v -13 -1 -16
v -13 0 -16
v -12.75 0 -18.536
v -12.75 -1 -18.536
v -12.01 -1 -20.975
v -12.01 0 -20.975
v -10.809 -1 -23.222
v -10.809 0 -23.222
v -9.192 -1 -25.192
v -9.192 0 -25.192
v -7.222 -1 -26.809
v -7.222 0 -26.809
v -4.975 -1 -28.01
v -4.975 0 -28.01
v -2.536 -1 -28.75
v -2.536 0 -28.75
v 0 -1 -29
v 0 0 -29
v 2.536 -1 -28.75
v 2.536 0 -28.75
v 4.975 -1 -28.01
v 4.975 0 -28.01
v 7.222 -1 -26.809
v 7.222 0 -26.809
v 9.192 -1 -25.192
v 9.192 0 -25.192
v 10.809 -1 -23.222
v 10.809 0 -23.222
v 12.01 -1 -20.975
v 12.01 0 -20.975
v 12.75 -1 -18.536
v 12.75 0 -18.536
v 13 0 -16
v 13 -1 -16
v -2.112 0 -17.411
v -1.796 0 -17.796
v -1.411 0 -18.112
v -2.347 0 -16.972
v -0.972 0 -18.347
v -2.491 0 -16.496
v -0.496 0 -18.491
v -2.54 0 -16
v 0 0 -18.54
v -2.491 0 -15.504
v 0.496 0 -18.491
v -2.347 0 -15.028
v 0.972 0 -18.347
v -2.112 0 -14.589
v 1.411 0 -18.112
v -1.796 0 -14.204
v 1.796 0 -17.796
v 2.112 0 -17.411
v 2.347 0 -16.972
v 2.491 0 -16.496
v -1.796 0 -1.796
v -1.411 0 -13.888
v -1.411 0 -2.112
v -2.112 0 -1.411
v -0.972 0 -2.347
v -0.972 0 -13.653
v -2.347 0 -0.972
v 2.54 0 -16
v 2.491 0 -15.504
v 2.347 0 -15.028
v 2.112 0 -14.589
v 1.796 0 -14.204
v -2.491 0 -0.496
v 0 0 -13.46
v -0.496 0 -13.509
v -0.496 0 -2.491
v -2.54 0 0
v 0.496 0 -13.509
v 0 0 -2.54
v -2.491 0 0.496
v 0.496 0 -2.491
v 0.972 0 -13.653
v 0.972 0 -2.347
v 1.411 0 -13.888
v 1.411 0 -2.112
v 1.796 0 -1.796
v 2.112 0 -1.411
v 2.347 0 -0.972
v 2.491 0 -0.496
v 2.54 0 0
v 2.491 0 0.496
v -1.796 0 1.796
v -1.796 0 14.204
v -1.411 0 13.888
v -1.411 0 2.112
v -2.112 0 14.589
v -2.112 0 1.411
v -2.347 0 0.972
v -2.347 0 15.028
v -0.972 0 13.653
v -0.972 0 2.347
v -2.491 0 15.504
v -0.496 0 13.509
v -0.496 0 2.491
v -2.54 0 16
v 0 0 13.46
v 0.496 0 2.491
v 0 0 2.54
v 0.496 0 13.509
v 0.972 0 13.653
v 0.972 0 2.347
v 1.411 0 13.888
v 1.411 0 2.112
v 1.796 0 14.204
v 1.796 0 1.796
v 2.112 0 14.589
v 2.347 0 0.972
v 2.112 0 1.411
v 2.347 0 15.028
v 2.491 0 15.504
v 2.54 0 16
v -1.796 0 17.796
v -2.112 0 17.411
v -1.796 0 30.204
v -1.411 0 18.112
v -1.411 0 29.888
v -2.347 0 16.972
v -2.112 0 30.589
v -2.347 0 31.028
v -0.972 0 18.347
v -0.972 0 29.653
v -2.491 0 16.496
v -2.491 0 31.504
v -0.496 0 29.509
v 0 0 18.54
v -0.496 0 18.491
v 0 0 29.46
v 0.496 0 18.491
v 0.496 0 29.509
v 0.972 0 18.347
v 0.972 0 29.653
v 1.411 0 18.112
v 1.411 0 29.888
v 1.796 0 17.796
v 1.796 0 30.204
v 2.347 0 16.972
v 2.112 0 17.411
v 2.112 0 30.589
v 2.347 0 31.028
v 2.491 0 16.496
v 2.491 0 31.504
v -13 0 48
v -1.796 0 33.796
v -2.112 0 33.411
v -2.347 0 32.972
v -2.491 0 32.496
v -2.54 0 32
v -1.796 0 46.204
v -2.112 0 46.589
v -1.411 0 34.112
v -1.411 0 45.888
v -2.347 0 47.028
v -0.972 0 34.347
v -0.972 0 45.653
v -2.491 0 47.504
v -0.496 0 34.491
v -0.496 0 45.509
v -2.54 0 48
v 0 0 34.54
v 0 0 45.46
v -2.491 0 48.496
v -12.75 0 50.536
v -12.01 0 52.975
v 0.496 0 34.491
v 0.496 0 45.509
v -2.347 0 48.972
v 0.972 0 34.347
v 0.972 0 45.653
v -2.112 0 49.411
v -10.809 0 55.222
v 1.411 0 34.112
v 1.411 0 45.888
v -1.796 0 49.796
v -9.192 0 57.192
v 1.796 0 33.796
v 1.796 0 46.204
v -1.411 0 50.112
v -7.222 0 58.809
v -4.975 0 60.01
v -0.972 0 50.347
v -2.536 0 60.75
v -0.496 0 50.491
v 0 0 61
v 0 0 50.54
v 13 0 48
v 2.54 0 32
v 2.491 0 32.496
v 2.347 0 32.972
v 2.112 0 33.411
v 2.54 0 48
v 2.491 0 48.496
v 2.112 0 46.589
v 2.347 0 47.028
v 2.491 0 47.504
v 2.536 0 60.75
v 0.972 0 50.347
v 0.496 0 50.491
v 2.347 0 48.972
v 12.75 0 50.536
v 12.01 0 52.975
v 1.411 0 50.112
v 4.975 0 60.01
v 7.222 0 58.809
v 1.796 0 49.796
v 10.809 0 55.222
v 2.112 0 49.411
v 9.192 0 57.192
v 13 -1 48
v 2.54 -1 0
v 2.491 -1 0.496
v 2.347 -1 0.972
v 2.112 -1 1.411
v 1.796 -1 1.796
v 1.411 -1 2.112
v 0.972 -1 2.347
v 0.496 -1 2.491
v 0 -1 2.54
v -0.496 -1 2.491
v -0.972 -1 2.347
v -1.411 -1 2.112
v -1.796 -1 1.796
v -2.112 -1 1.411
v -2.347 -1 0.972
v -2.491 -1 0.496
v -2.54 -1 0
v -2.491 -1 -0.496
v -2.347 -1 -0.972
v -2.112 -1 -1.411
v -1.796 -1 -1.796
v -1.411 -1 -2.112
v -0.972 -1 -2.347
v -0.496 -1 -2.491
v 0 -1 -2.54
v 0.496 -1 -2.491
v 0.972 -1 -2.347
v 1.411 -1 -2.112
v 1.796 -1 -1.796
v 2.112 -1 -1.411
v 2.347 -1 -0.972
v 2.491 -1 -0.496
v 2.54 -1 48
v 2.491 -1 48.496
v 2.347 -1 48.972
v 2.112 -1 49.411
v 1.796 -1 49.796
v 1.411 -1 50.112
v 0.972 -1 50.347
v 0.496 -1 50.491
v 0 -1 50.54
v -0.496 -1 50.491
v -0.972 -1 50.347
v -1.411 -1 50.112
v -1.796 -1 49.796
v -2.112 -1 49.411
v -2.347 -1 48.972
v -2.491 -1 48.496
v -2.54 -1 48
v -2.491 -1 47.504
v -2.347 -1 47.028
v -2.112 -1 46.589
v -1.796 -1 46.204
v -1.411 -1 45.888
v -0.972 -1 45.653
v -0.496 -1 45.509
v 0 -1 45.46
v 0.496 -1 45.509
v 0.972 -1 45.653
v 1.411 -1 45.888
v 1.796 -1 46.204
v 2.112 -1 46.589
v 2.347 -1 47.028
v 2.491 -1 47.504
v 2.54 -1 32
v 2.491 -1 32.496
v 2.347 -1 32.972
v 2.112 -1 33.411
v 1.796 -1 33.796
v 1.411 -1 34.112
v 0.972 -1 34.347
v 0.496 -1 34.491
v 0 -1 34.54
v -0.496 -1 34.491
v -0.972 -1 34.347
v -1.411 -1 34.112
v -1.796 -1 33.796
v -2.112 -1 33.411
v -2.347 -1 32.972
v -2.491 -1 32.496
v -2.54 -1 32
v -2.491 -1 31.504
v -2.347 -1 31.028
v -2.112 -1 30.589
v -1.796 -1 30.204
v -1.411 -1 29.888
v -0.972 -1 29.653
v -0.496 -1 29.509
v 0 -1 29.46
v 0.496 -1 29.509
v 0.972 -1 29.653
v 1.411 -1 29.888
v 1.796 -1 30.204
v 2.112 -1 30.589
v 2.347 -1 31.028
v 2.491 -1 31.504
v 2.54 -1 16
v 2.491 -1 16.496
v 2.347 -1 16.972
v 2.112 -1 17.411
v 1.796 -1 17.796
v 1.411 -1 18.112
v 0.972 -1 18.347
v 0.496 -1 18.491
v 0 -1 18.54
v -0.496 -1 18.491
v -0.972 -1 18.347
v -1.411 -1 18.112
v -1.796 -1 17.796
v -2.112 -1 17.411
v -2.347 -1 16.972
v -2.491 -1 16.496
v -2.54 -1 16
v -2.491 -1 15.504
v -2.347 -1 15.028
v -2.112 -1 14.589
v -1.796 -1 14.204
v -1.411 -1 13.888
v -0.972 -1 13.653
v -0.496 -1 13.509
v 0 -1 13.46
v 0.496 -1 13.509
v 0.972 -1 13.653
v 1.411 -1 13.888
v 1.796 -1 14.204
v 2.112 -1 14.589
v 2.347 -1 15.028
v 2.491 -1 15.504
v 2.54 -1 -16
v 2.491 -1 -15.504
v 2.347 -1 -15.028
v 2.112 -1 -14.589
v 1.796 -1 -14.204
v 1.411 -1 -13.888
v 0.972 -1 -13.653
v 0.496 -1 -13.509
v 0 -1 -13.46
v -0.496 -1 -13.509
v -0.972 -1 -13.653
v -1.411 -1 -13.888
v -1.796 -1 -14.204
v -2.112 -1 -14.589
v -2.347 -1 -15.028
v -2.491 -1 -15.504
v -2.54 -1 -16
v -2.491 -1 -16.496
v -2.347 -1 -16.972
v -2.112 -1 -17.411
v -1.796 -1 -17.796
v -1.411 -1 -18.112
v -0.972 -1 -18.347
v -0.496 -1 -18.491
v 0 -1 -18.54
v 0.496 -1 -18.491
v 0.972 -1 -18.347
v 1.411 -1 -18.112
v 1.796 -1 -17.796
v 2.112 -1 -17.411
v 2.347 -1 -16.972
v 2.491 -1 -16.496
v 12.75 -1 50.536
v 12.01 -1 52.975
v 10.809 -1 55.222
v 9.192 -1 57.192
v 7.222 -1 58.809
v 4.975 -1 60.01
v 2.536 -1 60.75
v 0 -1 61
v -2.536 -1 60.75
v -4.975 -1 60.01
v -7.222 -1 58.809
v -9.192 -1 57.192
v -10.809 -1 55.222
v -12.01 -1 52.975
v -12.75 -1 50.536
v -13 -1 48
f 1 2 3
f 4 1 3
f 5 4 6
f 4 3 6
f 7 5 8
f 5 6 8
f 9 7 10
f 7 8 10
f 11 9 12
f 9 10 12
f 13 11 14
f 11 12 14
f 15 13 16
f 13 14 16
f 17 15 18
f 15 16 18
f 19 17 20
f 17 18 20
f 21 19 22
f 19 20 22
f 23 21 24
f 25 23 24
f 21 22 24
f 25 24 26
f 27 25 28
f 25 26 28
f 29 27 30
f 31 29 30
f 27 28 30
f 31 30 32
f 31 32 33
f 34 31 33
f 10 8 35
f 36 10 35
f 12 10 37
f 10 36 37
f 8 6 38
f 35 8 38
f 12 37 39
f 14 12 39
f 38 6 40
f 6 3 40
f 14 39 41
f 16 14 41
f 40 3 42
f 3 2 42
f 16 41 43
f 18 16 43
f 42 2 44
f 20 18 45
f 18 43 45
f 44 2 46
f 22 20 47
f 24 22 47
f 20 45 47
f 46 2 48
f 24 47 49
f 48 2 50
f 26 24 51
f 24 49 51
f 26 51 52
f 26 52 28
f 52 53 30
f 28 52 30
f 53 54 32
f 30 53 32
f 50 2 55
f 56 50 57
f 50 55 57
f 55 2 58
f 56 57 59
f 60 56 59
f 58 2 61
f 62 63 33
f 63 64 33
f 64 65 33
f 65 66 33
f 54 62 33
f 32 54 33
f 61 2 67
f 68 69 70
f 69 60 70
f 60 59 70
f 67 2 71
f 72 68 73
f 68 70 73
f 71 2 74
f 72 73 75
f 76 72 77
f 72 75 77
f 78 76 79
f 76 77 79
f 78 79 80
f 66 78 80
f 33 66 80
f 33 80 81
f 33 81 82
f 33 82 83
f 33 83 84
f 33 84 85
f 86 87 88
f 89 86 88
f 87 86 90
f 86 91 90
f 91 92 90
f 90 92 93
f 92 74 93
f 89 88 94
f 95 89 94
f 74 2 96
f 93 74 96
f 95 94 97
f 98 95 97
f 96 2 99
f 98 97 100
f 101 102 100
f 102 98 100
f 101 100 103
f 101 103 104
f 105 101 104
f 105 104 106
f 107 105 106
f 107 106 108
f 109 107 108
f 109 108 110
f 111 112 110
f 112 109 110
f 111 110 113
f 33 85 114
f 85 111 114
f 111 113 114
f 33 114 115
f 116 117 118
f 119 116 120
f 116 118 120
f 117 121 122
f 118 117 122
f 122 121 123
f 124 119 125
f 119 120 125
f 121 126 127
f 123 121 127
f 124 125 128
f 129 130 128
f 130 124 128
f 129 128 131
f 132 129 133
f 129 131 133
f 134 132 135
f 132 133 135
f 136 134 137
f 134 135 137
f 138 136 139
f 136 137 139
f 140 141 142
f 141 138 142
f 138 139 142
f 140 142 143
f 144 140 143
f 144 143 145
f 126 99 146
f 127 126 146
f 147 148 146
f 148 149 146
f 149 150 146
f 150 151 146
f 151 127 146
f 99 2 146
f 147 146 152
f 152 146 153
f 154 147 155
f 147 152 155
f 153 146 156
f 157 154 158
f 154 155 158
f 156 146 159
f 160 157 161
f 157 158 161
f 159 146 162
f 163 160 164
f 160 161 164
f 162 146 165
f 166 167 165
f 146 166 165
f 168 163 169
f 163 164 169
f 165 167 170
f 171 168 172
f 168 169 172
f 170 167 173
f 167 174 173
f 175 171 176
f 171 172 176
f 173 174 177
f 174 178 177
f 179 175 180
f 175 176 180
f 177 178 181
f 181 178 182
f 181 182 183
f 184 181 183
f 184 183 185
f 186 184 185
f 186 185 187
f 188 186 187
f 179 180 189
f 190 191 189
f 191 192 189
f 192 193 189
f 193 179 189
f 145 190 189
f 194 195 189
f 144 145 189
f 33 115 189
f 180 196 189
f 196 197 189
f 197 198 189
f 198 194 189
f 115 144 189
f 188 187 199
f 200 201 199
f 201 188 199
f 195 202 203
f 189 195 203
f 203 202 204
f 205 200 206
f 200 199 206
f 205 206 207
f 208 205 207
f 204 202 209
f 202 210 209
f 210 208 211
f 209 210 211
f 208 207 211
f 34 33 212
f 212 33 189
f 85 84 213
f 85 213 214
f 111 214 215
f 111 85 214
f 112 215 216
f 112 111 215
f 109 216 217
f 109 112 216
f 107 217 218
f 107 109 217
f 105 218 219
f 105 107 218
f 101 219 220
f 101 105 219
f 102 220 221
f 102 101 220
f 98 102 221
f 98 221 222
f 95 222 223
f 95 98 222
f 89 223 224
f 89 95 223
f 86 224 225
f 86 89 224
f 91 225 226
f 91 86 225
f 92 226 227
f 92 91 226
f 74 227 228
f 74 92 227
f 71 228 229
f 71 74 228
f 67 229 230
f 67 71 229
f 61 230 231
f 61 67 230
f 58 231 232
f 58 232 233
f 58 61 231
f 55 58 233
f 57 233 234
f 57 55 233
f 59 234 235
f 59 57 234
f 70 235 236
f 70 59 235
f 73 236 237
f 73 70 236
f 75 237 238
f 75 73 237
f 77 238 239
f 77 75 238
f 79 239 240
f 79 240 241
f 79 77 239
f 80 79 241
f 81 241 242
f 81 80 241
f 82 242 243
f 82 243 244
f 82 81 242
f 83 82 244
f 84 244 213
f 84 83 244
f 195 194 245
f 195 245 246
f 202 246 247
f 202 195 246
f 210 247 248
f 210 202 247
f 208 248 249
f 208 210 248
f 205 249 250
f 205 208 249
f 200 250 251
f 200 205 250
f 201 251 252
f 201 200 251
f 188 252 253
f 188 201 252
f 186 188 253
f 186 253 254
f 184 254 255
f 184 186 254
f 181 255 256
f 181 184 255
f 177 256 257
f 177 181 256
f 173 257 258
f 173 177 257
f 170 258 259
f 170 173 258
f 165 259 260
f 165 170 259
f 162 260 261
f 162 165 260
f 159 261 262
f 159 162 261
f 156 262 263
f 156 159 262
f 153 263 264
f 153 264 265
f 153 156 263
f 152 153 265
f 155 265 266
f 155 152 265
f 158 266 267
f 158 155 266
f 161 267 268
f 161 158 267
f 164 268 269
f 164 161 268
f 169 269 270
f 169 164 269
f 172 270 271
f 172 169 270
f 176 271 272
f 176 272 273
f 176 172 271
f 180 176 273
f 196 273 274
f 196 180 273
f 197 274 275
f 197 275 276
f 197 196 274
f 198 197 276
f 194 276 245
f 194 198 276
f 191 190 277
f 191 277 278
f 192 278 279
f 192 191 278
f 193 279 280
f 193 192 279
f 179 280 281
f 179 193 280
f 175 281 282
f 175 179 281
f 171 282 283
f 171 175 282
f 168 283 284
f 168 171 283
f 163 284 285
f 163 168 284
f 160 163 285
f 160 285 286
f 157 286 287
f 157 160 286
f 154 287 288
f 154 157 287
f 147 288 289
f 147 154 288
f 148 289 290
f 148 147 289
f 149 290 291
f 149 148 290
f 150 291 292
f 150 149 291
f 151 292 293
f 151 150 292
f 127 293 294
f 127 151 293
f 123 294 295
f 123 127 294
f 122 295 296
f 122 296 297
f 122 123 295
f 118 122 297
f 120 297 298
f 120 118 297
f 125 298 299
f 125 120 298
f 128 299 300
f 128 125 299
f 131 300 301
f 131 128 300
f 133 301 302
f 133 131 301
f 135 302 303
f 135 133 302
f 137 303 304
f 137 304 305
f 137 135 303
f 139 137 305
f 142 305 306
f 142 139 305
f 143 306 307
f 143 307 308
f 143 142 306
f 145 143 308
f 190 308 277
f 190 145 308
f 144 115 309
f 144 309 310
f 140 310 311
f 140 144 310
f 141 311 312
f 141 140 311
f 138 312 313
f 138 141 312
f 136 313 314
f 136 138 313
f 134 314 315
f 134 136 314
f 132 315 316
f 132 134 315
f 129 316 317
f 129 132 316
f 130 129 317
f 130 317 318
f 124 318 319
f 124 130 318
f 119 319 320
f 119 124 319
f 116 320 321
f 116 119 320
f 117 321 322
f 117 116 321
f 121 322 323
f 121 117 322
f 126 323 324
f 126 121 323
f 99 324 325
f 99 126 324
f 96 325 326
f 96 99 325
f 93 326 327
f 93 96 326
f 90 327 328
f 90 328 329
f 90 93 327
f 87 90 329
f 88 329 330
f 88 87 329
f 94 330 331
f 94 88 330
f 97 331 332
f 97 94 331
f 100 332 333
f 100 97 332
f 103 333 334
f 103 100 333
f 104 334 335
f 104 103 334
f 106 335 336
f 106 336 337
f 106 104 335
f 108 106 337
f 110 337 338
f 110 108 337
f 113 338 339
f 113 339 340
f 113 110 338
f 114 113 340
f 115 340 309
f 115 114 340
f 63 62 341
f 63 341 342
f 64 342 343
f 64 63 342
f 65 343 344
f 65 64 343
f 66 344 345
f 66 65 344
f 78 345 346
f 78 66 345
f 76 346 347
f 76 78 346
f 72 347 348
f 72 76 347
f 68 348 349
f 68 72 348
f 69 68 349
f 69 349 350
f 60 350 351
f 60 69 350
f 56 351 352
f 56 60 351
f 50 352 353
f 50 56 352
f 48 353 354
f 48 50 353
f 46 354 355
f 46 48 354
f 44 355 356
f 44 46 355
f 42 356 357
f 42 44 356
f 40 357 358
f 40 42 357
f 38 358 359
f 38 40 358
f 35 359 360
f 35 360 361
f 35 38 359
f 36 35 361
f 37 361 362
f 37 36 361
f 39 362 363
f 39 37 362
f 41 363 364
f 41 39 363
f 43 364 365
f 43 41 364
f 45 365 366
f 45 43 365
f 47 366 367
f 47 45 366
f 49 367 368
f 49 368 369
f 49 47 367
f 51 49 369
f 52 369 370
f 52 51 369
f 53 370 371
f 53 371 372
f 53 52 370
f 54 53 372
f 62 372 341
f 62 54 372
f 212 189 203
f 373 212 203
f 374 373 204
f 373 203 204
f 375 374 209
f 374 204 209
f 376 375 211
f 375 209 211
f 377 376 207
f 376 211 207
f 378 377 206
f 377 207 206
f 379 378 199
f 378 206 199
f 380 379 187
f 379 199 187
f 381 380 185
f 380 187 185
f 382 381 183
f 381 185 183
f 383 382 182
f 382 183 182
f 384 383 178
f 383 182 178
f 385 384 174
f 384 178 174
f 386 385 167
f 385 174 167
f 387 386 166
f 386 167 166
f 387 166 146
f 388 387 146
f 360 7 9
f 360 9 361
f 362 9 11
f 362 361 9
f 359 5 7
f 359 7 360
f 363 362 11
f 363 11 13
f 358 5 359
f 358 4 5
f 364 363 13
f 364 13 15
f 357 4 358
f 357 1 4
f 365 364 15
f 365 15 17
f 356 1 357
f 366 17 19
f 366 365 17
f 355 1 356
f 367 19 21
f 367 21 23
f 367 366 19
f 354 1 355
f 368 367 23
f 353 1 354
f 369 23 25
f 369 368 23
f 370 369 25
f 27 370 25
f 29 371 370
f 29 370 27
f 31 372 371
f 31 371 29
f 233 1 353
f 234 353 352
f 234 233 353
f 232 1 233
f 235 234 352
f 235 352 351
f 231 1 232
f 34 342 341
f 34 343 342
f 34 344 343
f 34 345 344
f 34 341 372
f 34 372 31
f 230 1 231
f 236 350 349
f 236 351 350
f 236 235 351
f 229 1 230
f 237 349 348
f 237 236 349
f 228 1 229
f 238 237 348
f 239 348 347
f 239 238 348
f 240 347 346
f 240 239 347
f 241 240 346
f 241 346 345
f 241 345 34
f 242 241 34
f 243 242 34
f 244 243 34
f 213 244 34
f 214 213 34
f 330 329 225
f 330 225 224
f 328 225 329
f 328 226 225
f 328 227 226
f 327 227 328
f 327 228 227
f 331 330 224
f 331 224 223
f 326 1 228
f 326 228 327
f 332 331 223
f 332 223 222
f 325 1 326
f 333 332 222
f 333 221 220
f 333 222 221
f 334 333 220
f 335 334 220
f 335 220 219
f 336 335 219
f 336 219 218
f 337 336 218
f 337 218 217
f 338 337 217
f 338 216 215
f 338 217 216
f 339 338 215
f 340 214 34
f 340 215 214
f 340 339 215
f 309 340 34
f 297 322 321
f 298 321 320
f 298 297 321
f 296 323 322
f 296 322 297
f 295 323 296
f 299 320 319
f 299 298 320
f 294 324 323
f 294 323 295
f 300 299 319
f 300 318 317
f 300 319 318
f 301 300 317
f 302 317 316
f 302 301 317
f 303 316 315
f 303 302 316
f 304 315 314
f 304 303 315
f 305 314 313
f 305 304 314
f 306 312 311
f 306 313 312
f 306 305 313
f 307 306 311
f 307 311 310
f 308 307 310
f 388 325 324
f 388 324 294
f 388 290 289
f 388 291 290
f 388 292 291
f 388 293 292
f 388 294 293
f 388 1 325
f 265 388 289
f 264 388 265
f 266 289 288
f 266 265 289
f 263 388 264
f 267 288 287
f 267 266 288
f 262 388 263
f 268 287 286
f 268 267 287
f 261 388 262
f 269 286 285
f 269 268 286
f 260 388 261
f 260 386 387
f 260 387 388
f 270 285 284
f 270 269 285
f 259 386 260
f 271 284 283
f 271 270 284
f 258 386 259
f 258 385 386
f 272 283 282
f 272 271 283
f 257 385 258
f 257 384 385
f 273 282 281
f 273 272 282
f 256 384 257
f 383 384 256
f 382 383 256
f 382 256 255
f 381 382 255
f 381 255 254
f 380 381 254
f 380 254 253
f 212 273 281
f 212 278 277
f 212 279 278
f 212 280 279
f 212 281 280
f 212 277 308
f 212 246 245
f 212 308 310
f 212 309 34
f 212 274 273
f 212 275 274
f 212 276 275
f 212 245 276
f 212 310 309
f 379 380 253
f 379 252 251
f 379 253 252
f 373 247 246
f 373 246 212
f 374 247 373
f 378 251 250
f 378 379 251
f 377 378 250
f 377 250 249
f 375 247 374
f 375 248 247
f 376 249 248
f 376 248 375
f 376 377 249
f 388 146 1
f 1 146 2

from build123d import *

# Parameters (mm, degrees)
F0_R     = 2.54
F1_DEPTH = 1


with BuildPart() as f1:
    # F0 (on Front) → F1 (new body)
    with BuildSketch(Plane.XZ):
        with BuildLine():
            ThreePointArc((13, 48), (0, 35), (-13, 48))
            Line((-13, 48), (-13, -16))
            ThreePointArc((-13, -16), (0, -3), (13, -16))
            Line((13, -16), (13, 48))
        make_face()
        Circle(F0_R, mode=Mode.SUBTRACT)
        with Locations((0, 16)):
            Circle(F0_R, mode=Mode.SUBTRACT)
        with Locations((0, 32)):
            Circle(F0_R, mode=Mode.SUBTRACT)
        with BuildLine():
            ThreePointArc((13, 48), (0, 61), (-13, 48))
            ThreePointArc((-13, 48), (0, 35), (13, 48))
        make_face()
        with Locations((0, 48)):
            Circle(F0_R, mode=Mode.SUBTRACT)
        with BuildLine():
            ThreePointArc((13, -16), (0, -3), (-13, -16))
            ThreePointArc((-13, -16), (0, -29), (13, -16))
        make_face()
        with Locations((0, -16)):
            Circle(F0_R, mode=Mode.SUBTRACT)
    extrude(amount=F1_DEPTH)


solid = f1.part
